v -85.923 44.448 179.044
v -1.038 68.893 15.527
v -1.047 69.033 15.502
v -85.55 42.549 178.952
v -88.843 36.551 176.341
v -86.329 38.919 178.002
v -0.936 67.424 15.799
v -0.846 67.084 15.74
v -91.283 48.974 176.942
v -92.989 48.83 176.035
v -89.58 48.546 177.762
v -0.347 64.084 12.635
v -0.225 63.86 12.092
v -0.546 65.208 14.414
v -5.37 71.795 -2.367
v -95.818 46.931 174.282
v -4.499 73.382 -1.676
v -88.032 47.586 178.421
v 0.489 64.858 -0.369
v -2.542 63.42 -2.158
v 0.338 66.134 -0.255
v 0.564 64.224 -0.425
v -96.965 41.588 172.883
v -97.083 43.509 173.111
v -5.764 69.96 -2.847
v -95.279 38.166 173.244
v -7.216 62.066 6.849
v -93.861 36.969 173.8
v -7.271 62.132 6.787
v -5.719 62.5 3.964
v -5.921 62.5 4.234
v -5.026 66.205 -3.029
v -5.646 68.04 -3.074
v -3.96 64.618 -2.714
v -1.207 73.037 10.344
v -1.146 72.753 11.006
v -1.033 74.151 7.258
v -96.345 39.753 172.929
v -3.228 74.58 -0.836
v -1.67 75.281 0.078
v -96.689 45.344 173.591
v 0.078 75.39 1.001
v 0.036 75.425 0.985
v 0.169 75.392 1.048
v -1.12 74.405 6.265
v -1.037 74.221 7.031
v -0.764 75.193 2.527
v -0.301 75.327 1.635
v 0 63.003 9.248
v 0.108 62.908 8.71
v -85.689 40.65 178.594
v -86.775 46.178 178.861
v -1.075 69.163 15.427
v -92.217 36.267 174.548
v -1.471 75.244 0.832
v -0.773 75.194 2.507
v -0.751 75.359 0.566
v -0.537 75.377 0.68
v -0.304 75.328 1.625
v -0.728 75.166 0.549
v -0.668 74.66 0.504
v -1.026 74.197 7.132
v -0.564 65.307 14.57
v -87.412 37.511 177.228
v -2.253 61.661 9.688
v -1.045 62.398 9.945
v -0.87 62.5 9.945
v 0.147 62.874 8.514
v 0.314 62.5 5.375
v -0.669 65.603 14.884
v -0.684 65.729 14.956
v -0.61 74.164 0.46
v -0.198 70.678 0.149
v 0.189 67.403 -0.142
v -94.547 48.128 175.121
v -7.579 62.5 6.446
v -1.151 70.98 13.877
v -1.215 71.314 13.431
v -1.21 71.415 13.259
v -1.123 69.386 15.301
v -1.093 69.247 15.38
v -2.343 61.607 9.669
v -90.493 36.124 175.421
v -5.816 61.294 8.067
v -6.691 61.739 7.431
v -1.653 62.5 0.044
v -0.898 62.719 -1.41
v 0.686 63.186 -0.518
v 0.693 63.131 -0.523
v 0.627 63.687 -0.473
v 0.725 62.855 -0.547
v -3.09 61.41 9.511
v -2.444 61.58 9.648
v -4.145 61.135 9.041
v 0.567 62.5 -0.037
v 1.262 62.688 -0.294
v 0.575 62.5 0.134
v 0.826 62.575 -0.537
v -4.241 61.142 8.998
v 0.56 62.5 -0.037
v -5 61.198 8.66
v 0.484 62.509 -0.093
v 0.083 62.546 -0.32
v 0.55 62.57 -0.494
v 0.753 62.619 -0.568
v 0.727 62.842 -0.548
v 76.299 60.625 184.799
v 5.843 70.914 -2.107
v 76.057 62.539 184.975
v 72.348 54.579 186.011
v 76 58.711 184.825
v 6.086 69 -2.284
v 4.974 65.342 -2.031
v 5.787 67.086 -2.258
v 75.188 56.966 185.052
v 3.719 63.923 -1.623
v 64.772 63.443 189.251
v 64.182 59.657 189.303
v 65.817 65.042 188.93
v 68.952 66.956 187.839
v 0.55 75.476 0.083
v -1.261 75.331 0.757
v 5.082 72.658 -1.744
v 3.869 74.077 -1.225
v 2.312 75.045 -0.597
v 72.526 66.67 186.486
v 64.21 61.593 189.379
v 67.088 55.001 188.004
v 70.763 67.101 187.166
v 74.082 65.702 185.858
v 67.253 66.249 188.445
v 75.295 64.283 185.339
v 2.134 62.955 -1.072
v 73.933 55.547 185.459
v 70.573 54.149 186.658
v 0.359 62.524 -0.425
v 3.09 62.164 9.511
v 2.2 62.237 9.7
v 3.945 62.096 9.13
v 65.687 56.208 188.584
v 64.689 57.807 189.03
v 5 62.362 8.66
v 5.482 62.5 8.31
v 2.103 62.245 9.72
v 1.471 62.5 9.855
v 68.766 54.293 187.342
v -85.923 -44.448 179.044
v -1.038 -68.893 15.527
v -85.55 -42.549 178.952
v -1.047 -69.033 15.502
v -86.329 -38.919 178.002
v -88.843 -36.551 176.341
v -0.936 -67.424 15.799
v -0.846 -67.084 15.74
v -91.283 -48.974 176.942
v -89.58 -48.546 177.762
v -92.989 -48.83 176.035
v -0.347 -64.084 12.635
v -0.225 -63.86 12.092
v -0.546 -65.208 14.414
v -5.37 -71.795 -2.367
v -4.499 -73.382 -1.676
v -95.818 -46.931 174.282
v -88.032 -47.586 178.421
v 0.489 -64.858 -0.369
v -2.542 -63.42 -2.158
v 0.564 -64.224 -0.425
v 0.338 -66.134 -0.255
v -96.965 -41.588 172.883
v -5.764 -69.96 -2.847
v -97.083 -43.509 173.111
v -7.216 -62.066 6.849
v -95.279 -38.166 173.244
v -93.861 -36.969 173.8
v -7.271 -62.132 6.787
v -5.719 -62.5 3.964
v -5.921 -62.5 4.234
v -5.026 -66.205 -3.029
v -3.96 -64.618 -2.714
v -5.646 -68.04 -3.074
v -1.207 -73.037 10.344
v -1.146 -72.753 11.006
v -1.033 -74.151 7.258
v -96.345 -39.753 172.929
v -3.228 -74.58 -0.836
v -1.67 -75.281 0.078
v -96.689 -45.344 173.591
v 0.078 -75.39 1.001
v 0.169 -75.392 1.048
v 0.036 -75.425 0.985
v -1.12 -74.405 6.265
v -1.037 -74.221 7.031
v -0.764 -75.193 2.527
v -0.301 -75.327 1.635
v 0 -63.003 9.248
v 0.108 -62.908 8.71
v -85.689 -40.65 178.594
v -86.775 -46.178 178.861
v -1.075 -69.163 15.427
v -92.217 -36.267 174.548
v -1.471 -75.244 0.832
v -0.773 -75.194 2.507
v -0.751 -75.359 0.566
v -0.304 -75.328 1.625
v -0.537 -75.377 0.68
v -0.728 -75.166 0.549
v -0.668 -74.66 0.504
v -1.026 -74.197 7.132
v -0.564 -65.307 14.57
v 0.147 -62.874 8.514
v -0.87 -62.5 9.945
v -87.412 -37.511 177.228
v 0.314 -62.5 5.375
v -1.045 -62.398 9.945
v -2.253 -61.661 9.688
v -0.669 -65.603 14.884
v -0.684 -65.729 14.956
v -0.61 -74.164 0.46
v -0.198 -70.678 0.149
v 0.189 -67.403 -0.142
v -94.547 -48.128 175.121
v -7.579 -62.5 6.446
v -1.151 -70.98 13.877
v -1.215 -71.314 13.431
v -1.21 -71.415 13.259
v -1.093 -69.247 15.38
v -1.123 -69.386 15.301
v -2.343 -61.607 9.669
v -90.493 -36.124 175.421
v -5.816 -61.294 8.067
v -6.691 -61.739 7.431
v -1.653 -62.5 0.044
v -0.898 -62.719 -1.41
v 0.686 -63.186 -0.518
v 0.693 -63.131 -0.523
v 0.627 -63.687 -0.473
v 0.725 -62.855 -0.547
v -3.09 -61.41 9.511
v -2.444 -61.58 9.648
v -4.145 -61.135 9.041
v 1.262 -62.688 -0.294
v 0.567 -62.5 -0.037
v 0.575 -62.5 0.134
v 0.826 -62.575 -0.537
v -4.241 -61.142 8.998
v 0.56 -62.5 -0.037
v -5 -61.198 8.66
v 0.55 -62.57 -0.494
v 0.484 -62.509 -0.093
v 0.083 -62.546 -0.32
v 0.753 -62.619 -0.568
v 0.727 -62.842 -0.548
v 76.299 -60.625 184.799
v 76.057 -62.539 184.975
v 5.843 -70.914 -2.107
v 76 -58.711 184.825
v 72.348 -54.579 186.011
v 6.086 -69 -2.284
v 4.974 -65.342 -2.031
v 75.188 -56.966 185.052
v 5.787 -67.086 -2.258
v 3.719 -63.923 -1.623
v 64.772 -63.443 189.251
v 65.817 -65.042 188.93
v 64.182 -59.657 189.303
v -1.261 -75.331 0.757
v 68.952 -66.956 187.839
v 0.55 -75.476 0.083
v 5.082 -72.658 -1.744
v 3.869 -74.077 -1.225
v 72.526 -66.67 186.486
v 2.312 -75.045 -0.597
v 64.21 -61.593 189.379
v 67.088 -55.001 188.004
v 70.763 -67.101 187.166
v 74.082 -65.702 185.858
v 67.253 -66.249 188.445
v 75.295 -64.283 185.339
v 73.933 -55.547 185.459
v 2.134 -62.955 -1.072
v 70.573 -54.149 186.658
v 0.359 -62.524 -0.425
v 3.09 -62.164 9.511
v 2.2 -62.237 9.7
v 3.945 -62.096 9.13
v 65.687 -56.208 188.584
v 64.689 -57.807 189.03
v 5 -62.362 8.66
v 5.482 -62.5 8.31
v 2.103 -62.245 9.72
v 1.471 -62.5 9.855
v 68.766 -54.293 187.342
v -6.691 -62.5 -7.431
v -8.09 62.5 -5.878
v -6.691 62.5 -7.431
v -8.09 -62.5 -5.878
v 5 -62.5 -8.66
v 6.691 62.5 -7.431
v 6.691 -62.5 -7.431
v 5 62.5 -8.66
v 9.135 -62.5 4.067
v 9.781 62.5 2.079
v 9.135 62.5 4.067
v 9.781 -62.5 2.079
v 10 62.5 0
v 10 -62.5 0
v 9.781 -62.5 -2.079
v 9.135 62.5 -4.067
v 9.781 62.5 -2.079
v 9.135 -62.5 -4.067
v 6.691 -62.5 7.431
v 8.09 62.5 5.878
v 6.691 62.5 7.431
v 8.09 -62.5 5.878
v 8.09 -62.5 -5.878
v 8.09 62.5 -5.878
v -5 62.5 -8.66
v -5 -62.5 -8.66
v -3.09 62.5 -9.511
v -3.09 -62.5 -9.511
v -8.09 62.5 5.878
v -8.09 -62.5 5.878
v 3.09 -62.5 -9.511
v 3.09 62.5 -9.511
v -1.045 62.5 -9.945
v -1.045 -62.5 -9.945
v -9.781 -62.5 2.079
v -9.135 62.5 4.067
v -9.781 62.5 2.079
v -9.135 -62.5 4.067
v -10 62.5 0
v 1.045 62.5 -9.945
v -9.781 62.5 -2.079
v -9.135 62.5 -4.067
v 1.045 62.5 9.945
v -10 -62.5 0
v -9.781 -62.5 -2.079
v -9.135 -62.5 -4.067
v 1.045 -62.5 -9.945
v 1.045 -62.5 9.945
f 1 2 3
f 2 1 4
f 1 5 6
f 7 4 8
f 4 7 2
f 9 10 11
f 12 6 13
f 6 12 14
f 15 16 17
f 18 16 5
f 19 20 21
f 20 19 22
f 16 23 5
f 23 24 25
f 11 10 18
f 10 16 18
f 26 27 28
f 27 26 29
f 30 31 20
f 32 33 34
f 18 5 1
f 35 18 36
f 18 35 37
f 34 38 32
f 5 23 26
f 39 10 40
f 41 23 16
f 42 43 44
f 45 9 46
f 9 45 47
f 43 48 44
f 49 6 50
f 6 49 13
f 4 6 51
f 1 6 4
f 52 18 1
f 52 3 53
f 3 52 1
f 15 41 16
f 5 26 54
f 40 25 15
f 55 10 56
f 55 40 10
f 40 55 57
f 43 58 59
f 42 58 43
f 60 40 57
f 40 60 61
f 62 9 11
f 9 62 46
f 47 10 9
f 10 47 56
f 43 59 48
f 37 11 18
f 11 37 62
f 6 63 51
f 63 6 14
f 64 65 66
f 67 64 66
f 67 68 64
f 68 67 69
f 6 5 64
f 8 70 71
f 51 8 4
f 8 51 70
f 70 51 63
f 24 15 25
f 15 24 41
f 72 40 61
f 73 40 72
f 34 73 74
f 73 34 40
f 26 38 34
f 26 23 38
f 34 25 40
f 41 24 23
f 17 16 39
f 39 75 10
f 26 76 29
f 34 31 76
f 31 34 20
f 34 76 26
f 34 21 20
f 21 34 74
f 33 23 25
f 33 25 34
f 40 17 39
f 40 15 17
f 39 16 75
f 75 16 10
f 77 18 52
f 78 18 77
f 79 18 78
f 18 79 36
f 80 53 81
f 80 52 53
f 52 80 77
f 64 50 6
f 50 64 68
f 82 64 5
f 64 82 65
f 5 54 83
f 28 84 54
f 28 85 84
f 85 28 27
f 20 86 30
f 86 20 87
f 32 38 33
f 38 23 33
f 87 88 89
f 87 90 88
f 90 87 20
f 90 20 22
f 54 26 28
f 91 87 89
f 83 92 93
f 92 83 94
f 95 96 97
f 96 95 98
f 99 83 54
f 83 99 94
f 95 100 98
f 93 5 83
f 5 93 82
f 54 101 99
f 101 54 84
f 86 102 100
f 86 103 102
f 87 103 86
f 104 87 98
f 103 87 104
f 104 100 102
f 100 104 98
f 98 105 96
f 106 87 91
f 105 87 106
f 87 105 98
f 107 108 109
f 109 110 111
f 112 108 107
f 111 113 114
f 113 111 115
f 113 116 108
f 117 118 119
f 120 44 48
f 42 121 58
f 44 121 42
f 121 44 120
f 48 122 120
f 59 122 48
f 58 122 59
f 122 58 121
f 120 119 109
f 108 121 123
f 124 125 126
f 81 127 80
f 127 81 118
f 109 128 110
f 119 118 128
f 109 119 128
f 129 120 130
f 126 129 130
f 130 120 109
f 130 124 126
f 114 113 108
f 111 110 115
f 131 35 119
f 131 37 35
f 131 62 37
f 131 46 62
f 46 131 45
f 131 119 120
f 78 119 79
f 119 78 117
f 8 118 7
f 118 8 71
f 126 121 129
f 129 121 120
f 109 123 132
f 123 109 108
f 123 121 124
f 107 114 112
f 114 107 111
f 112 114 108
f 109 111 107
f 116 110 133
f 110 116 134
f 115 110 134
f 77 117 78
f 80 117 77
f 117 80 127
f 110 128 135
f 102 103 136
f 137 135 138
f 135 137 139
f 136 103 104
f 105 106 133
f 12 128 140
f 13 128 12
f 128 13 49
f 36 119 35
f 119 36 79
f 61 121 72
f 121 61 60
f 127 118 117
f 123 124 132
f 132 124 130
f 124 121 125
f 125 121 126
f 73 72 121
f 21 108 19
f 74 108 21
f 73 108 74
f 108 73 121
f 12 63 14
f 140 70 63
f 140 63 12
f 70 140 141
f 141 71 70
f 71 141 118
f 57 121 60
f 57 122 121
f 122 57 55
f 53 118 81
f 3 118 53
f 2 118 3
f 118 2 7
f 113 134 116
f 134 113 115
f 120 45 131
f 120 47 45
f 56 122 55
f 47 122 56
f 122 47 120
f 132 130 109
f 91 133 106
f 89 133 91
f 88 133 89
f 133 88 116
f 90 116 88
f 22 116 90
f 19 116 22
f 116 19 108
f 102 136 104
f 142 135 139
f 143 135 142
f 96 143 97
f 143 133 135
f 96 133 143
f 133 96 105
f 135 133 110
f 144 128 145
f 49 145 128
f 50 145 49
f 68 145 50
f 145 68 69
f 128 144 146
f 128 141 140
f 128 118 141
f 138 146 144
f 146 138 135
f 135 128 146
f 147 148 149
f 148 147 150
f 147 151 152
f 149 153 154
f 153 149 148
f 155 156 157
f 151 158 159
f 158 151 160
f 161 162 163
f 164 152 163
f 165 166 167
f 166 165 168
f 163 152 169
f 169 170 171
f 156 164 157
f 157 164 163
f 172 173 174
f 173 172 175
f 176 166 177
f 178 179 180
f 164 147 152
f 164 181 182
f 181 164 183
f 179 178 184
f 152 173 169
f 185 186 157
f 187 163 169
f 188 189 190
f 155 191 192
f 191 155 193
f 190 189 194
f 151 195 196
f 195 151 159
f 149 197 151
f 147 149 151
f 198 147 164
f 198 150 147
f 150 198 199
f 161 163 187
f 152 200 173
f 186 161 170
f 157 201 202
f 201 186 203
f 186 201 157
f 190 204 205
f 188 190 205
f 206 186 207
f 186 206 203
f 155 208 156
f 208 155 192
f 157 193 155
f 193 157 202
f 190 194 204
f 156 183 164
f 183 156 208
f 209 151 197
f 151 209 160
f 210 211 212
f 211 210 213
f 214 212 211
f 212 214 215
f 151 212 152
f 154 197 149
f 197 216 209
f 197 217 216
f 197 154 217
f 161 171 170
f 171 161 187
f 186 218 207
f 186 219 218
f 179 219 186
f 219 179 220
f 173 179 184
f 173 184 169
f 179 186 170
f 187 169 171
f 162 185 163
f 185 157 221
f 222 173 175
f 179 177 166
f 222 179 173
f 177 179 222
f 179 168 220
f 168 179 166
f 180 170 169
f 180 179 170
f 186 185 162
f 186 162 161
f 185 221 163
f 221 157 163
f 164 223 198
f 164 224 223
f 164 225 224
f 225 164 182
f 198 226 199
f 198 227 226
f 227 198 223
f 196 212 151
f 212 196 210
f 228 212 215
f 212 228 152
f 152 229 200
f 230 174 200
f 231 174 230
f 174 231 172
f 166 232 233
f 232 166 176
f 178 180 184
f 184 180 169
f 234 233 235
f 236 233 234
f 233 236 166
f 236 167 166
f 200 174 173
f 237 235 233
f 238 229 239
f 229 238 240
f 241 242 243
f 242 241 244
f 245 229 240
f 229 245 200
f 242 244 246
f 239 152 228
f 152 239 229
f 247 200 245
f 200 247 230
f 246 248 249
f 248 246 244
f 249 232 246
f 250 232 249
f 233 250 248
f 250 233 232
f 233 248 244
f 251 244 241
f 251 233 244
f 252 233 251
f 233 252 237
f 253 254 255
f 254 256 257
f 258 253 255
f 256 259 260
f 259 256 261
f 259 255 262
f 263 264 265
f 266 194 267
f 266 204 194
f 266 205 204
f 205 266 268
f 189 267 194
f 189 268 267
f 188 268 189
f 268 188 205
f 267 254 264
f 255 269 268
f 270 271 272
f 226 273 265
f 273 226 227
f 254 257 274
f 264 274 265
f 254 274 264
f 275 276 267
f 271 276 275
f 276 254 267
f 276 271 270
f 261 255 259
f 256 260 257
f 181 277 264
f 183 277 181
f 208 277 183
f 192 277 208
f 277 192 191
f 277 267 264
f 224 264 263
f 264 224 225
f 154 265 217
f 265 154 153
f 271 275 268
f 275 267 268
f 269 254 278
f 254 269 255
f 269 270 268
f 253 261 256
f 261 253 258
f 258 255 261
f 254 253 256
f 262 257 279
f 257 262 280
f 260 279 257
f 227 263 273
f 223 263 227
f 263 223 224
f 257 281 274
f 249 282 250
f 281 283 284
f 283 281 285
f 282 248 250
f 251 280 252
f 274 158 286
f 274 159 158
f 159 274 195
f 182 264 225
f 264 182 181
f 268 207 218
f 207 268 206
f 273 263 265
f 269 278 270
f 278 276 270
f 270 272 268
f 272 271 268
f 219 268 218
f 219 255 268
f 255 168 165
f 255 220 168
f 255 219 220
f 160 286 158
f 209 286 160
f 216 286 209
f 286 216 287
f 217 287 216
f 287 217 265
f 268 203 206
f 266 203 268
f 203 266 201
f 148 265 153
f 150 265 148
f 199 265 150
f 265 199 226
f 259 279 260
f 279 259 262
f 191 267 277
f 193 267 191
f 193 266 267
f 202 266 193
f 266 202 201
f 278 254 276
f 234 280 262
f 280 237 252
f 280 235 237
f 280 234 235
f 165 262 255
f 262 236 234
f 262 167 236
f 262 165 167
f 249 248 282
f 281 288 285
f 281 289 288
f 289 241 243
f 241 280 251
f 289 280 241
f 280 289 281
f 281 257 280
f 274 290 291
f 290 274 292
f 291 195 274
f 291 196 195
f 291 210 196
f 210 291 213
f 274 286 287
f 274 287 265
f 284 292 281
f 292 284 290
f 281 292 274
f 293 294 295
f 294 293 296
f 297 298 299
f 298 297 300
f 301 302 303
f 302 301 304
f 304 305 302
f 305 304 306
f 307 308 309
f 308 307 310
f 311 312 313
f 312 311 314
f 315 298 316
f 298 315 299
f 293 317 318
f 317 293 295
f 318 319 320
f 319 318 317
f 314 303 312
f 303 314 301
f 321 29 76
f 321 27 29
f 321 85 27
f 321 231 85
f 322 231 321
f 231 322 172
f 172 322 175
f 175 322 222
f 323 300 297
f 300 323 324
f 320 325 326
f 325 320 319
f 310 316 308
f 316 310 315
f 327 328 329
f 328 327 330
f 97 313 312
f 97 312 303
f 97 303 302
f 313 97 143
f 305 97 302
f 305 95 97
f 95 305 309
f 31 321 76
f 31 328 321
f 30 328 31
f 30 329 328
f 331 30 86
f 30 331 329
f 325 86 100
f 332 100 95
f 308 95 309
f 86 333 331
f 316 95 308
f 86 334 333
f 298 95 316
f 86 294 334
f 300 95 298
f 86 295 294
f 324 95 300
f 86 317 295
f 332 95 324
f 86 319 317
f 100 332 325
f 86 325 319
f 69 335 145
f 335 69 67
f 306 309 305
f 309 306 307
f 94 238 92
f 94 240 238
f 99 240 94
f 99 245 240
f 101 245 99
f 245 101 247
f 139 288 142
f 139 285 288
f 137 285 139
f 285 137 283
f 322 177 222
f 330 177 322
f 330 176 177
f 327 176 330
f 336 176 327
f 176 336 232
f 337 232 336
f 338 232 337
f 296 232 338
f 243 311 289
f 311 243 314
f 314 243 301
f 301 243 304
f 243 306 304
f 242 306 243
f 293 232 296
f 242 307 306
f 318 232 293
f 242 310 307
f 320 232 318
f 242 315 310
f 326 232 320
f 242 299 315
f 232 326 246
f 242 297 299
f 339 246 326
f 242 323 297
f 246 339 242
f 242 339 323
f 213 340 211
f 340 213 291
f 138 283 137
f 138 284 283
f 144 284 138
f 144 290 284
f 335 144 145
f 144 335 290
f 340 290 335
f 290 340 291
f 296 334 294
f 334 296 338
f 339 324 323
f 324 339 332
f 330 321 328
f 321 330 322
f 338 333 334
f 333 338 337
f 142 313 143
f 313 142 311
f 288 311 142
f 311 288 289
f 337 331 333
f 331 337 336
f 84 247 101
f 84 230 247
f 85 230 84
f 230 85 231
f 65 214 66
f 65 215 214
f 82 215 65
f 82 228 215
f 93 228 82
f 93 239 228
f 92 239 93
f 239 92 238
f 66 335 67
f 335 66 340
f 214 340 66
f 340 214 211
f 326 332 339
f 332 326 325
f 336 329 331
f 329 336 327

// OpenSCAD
// file: bike_params.scad
/*
 * Copyright (c) 2012 Haydn Vesta
 * 
 * See the file license.txt for copying permission.
 *
 */

bicycle_axis_width = 125;
bicycle_axis_radius = 10;
bicycle_strut_radius = 6.5;
bicycle_x_front_offset = 48 * (4/7);
bicycle_x_rear_offset = 48 * (3/7);
bicycle_y_front_offset = 7.6;
bicycle_y_rear_offset = 2.4;
bike_frame_height = 200;

bicycle_gear_spacing = 12.5;
bicycle_gear_teeth = 18;
bicycle_gear_thickness = 4;
bicycle_gear_circle_radius = 32;
bicycle_axis_radius = 10;
// main file
/*
 * Copyright (c) 2012 Haydn Vesta
 * 
 * See the file license.txt for copying permission.
 *
 */

include <bike_params.scad>

module bike_frame_side() {
  translate([0, (bicycle_axis_width/2) + bicycle_strut_radius, 0]) {
    rotate([bicycle_y_front_offset, -bicycle_x_front_offset, 0]) {
      cylinder(h=bike_frame_height, r=bicycle_strut_radius);
    }
    rotate([bicycle_y_rear_offset, bicycle_x_rear_offset, 0]) {
      cylinder(h=bike_frame_height, r=bicycle_strut_radius);
    }
  }
}

module bike_frame() {
  bike_frame_side();
  mirror([0, 1, 0]) bike_frame_side();
  translate([0, bicycle_axis_width/2, 0]) {
    rotate([90, 0, 0]) {
      cylinder(h=bicycle_axis_width, r=bicycle_axis_radius);
    }
  }
}

bike_frame();
